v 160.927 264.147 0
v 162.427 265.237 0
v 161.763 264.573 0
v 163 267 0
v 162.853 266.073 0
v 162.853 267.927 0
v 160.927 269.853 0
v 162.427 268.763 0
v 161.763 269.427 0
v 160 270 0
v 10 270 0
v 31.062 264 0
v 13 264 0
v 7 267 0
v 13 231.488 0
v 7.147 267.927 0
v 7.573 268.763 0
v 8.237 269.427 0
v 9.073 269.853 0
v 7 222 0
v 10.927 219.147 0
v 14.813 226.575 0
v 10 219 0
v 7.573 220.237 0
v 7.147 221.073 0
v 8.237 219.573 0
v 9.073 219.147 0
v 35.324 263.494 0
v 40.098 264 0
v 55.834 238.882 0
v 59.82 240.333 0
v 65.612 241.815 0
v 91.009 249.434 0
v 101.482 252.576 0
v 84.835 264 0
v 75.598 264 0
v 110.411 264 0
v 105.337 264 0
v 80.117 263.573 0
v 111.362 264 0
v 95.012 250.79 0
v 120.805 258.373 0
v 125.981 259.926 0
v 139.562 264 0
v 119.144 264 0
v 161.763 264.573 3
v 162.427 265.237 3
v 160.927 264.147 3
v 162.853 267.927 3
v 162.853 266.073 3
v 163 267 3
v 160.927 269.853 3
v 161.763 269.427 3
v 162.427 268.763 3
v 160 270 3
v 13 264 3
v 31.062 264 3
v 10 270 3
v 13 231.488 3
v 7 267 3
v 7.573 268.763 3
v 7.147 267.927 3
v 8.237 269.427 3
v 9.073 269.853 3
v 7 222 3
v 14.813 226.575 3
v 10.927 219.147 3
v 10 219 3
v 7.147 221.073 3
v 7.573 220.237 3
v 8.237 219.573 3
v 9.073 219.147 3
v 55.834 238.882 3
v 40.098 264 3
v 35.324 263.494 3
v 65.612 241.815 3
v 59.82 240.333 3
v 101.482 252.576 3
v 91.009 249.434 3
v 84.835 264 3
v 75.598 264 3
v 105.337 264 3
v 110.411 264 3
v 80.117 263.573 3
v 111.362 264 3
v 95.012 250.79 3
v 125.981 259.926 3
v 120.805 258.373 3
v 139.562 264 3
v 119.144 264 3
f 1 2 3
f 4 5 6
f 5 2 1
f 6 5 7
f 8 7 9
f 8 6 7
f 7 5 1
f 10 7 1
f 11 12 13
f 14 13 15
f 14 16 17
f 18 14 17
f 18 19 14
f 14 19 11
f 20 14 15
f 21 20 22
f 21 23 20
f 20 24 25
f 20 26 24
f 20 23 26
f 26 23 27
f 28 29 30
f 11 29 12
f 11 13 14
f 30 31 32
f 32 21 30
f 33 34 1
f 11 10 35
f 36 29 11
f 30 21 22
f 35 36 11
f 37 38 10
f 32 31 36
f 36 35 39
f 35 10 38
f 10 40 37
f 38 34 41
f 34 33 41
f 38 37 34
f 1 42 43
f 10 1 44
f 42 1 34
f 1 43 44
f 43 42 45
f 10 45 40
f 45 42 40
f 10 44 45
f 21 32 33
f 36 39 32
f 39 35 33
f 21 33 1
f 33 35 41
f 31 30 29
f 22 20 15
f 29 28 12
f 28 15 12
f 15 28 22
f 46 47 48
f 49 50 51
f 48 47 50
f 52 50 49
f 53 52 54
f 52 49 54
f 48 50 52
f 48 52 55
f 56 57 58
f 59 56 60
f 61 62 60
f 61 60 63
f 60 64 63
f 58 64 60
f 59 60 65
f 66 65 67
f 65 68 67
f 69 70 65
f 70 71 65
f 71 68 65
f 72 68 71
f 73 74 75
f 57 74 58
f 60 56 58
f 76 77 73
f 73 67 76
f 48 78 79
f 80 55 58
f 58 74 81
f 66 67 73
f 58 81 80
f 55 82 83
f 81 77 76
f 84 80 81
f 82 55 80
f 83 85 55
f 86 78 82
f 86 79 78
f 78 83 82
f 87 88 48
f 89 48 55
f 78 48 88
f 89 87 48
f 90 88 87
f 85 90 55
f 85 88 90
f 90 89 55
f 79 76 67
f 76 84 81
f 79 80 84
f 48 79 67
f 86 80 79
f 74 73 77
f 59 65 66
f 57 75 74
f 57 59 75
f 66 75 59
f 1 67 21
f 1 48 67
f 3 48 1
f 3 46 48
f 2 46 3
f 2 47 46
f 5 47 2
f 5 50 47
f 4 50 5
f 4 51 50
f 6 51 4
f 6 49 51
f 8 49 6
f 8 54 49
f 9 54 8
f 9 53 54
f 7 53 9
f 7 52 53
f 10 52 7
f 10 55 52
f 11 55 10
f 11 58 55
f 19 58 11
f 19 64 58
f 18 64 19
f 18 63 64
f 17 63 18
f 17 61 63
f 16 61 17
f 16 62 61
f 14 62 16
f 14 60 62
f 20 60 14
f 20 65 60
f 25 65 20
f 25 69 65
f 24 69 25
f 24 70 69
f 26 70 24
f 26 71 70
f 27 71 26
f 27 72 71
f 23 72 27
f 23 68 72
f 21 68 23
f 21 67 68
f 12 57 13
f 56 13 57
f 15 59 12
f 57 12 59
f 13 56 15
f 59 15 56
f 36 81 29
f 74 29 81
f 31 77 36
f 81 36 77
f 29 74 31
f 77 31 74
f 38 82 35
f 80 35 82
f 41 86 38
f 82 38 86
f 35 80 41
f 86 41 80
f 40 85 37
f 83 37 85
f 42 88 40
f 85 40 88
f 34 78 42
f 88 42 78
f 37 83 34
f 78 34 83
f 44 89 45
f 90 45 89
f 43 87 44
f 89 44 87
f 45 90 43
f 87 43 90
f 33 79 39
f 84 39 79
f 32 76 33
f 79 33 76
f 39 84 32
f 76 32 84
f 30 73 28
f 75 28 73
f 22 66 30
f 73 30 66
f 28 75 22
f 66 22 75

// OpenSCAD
// Generated by svg2scad. (https://github.com/mats-bergstrom/svg2scad).

// SVG Data
// width  = 210
// height = 297

// Settings
// origin = 1

// Path elements
// Path  0 "P_frame" (4)
s2s_P_frame_min = [10,222];
s2s_P_frame_max = [160,267];
s2s_P_frame_path = [
	[10,222],
	[160,267],
	[10,267],
	[10,222]
];

// Path  0 "P_z" (7)
s2s_P_z_min = [10,222];
s2s_P_z_max = [127,267];
s2s_P_z_path = [
	[10,222],
	[35,267],
	[60,237],
	[80,267],
	[95,247.529],
	[110.219,267],
	[127,257]
];


// Code Element 1
// p = [0,0]
T = 3;
module polyhull( P ) {
  N = len(P);
  for ( i = [1:N-1] )
    hull() {
      translate( P[i-1] ) children(0);
      translate( P[i-0] ) children(0);
    }
};
linear_extrude(T) {
polyhull( s2s_P_frame_path ) {
  circle(r=3,$fn=20);
}
polyhull( s2s_P_z_path ) {
  circle(r=2,$fn=20);
}
}
